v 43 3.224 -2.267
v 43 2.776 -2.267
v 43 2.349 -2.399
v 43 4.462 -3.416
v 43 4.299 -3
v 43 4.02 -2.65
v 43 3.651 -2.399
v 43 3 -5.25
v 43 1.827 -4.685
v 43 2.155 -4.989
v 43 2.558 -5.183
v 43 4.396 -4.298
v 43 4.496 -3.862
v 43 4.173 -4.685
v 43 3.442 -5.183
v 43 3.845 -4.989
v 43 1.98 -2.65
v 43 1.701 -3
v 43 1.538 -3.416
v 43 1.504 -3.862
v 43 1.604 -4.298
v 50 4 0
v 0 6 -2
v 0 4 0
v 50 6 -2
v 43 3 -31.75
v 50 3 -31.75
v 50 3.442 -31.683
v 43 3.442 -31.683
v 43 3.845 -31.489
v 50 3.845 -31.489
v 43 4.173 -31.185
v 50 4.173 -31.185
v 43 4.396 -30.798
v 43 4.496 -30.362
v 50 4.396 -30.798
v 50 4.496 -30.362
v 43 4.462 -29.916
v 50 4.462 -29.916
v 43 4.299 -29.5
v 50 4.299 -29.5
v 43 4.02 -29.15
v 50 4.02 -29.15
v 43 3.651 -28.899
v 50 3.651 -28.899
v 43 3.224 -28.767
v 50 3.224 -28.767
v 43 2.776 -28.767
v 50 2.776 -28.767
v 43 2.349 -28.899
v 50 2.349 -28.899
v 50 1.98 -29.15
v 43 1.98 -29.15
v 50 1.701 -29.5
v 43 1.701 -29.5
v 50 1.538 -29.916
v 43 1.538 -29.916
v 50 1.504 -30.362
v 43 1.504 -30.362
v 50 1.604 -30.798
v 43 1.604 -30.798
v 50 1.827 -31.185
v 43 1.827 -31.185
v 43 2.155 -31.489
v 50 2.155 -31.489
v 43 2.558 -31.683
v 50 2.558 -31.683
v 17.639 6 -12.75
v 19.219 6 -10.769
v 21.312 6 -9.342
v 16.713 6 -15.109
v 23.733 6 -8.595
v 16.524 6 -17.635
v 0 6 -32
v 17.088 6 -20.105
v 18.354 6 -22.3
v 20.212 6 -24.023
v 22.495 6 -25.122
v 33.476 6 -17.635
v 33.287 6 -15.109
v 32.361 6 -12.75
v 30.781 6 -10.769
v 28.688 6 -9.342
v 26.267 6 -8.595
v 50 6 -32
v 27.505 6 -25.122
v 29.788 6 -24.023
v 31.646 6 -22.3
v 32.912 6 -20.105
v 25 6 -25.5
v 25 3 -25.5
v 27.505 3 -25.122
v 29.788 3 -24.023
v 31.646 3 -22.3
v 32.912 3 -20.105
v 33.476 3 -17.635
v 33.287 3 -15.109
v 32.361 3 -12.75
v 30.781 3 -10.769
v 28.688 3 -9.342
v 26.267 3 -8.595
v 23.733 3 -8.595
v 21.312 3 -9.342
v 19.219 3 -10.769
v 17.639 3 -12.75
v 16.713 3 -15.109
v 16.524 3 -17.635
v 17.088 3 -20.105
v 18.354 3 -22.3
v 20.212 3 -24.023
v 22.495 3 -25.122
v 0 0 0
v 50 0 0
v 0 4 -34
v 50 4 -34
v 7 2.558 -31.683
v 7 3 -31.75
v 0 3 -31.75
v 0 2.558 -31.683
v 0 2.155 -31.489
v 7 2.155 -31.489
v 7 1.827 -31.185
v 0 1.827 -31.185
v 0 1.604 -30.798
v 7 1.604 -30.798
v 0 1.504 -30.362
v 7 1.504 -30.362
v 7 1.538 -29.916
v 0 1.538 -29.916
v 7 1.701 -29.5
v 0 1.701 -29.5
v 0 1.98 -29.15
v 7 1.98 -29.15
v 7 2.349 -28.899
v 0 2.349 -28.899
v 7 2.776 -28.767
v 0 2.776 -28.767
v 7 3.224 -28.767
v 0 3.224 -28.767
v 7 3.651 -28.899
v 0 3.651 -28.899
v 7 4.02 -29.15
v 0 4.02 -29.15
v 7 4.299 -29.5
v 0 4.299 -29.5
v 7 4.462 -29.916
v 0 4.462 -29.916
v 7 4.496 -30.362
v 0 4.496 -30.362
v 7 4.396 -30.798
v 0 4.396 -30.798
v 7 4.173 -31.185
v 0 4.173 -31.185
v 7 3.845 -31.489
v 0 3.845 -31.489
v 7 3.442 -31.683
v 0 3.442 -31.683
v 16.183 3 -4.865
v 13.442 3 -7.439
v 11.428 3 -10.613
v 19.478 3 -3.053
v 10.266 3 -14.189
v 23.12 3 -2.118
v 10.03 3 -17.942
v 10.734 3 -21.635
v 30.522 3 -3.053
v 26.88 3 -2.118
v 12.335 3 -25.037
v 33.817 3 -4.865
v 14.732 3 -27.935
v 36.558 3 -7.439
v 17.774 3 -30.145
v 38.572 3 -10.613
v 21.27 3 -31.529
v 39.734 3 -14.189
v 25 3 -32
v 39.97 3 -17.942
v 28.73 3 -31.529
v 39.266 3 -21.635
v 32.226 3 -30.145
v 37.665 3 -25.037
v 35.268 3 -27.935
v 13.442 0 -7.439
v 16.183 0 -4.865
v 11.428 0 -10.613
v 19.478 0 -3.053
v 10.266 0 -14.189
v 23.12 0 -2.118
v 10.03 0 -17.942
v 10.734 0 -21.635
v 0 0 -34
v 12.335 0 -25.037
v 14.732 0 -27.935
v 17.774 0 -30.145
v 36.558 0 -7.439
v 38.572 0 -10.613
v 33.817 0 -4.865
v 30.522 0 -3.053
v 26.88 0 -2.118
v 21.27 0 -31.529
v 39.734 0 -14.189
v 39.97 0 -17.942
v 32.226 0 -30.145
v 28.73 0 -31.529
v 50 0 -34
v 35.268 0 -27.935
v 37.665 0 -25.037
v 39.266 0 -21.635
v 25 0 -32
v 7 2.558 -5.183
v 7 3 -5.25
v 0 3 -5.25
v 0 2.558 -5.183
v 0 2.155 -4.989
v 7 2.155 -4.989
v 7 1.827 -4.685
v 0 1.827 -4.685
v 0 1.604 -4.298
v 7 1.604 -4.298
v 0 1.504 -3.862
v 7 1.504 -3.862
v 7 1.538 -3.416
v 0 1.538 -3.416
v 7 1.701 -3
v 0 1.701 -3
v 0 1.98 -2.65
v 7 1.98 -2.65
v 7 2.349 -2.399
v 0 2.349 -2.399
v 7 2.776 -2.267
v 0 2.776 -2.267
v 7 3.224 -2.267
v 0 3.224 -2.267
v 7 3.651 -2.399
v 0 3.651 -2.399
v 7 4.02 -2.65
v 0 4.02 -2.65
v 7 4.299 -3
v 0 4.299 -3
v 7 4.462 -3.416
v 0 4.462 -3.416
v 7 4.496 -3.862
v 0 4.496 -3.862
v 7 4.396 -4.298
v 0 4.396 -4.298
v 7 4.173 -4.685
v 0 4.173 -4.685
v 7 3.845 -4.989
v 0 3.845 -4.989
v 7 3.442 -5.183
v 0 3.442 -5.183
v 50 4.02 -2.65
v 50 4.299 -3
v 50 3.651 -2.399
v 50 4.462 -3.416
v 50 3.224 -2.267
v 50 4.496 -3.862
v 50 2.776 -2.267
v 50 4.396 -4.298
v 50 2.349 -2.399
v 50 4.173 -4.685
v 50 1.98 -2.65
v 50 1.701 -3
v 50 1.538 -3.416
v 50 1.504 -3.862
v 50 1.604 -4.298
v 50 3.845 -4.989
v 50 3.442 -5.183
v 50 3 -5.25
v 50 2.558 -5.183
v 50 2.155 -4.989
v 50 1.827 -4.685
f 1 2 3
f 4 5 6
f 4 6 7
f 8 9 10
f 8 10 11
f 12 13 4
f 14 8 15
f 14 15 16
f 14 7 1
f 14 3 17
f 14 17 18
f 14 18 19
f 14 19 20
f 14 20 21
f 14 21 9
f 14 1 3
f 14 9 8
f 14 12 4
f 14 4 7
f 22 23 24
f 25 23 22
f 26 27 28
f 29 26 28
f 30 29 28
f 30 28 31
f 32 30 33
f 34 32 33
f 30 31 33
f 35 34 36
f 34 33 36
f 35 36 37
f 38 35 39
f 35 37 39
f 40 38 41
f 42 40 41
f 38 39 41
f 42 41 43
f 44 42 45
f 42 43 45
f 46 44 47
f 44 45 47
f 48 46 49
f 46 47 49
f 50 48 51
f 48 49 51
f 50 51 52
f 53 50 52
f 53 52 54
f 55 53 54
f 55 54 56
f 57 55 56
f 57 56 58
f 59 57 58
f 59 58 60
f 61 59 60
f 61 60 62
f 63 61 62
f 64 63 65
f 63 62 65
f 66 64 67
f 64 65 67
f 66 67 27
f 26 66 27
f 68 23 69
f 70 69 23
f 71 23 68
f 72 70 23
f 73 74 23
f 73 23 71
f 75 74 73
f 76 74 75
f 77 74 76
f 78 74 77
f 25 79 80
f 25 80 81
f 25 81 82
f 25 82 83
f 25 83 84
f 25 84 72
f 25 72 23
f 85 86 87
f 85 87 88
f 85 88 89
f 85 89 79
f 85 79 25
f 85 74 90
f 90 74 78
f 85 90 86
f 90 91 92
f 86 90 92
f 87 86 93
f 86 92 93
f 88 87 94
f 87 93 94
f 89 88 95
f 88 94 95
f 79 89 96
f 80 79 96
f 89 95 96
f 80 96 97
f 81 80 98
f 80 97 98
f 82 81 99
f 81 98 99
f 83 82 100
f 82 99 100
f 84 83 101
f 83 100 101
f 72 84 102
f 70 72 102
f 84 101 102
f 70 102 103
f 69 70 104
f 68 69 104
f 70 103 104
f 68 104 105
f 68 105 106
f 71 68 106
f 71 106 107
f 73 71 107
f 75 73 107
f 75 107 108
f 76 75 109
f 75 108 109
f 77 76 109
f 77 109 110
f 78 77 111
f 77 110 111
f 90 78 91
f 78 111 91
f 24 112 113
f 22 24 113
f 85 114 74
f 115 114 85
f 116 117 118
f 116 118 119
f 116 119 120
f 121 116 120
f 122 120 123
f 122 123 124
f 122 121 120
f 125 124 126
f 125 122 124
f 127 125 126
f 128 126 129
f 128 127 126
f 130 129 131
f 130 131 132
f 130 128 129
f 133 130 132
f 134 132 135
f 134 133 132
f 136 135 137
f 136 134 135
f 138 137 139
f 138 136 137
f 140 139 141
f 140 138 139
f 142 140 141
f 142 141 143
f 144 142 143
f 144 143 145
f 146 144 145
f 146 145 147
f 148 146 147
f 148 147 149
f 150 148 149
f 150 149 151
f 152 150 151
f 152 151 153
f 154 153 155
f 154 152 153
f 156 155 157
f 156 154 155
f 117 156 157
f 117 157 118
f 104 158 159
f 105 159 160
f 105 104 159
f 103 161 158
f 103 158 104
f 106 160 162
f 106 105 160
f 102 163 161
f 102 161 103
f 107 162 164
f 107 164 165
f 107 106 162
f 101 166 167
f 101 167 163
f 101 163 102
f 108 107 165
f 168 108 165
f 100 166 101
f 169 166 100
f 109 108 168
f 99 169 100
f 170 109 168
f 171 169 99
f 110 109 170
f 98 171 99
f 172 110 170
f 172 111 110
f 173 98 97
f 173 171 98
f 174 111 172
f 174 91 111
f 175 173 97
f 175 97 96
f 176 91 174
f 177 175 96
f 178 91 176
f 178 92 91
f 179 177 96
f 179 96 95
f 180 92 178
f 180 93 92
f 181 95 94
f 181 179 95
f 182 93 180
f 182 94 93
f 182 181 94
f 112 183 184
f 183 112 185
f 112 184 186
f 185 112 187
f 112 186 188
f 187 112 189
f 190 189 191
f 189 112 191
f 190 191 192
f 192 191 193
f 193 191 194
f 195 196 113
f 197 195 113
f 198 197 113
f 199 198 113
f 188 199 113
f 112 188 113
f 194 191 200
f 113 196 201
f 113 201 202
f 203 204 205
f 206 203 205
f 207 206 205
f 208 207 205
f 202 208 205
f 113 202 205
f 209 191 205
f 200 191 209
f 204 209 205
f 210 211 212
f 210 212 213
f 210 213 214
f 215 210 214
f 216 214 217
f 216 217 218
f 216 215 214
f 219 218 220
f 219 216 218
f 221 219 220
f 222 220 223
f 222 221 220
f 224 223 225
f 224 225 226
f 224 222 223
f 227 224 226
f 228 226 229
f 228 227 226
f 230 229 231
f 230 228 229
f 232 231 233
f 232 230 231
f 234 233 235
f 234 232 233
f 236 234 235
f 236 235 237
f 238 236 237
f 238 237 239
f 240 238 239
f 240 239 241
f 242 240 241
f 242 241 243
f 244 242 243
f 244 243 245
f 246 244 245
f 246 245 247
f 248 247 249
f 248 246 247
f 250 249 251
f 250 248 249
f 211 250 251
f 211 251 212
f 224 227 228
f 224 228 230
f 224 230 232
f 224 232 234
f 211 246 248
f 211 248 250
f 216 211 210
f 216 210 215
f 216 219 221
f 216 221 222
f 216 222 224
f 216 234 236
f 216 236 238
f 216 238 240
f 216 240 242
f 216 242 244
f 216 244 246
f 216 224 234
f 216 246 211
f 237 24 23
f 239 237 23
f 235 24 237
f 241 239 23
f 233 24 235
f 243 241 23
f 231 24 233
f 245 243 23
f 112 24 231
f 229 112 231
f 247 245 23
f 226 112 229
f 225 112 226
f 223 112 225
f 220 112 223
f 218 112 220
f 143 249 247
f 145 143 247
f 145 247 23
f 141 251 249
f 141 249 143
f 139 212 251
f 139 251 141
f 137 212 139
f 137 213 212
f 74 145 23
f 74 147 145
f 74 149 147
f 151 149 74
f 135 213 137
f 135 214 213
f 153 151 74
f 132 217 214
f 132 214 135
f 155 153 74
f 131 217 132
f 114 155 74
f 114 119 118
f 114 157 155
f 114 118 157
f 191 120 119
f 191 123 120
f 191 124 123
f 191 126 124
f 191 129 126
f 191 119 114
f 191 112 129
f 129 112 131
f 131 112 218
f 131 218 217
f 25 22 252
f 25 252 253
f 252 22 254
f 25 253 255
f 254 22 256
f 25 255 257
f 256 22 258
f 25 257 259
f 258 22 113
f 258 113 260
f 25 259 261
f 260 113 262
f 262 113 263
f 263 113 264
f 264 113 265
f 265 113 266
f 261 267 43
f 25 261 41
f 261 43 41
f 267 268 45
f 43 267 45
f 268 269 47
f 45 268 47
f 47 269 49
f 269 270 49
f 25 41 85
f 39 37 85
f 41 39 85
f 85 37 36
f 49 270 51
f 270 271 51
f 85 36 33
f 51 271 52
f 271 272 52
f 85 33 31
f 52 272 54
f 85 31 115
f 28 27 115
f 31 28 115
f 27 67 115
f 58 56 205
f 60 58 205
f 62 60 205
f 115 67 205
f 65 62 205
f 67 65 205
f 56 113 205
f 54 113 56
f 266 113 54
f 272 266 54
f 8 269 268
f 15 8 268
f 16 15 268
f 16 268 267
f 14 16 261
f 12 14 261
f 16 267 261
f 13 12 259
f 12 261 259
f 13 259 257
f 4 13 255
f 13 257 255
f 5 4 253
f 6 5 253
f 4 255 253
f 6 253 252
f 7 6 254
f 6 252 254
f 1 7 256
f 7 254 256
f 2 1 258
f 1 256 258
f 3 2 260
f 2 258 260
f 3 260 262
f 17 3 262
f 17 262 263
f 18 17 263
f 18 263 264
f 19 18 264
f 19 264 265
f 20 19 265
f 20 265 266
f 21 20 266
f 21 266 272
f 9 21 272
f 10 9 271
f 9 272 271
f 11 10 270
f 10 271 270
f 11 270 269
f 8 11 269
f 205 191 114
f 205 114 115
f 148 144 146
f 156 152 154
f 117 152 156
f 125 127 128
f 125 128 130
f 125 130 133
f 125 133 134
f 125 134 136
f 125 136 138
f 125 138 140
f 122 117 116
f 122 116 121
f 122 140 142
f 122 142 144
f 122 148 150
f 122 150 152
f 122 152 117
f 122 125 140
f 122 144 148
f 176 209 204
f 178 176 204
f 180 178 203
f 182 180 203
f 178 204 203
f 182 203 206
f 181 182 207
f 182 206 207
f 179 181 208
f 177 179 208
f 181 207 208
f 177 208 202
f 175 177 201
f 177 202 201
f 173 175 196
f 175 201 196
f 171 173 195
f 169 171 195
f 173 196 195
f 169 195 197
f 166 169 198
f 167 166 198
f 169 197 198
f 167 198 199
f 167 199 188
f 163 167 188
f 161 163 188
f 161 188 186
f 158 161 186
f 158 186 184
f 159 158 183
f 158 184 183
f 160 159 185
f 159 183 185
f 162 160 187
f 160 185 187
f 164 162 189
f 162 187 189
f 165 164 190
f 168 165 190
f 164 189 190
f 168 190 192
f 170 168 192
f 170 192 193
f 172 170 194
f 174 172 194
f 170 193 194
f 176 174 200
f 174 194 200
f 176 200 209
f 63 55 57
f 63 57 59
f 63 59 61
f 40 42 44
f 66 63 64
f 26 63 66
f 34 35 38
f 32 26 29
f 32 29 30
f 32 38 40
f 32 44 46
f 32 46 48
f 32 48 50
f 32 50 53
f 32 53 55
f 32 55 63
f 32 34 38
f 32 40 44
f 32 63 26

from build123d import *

# Parameters (mm, degrees)
SKETCH1_W           = 50
SKETCH1_H           = 34
BOSS_EXTRUDE1_DEPTH = 6
SKETCH2_R           = 1.5
CUT_EXTRUDE1_DEPTH  = 7
CUT_EXTRUDE2_START  = -7
SKETCH3_R           = 1.5
CUT_EXTRUDE2_DEPTH  = 7
CHAMFER1_SIZE       = 2
SKETCH4_R           = 15
CUT_EXTRUDE3_DEPTH  = 3
SKETCH5_R           = 8.5
CUT_EXTRUDE4_DEPTH  = 3


with BuildPart() as part:
    # Sketch1 → Boss-Extrude1 (new body)
    with BuildSketch(Plane(origin=(0, 0, 0), x_dir=(1, 0, 0), z_dir=(0, 1, 0))):
        with Locations((25, 17)):
            Rectangle(SKETCH1_W, SKETCH1_H)
    extrude(amount=BOSS_EXTRUDE1_DEPTH)

    # Sketch2 → Cut-Extrude1 (cut)
    with BuildSketch(Plane(origin=(50, 0, 0), x_dir=(0, 0, -1), z_dir=(1, 0, 0))):
        with Locations((3.75, 3)):
            Circle(SKETCH2_R)
        with Locations((30.25, 3)):
            Circle(SKETCH2_R)
    extrude(amount=-CUT_EXTRUDE1_DEPTH, mode=Mode.SUBTRACT)

    # Sketch3 → Cut-Extrude2 (cut)
    with BuildSketch(Plane.ZY.offset(CUT_EXTRUDE2_START)):
        with Locations(Location((-30.25, 3, 0), (0, 0, 180))):
            Circle(SKETCH3_R)
        with Locations(Location((-3.75, 3, 0), (0, 0, 180))):
            Circle(SKETCH3_R)
    extrude(amount=CUT_EXTRUDE2_DEPTH, mode=Mode.SUBTRACT)

    # Chamfer1
    chamfer1_edges = [part.edges().sort_by_distance(p)[0] for p in [
        (25, 6, -34),
        (25, 6, 0),
    ]]
    chamfer(chamfer1_edges, length=CHAMFER1_SIZE)

    # Sketch4 → Cut-Extrude3 (cut)
    with BuildSketch(Plane.XZ):
        with Locations(Location((25, -17, 0), (0, 0, 270))):
            Circle(SKETCH4_R)
    extrude(amount=-CUT_EXTRUDE3_DEPTH, mode=Mode.SUBTRACT)

    # Sketch5 → Cut-Extrude4 (cut)
    with BuildSketch(Plane.XZ.offset(-3)):
        with Locations(Location((25, -17, 0), (0, 0, 270))):
            Circle(SKETCH5_R)
    extrude(amount=-CUT_EXTRUDE4_DEPTH, mode=Mode.SUBTRACT)


solid = part.part
